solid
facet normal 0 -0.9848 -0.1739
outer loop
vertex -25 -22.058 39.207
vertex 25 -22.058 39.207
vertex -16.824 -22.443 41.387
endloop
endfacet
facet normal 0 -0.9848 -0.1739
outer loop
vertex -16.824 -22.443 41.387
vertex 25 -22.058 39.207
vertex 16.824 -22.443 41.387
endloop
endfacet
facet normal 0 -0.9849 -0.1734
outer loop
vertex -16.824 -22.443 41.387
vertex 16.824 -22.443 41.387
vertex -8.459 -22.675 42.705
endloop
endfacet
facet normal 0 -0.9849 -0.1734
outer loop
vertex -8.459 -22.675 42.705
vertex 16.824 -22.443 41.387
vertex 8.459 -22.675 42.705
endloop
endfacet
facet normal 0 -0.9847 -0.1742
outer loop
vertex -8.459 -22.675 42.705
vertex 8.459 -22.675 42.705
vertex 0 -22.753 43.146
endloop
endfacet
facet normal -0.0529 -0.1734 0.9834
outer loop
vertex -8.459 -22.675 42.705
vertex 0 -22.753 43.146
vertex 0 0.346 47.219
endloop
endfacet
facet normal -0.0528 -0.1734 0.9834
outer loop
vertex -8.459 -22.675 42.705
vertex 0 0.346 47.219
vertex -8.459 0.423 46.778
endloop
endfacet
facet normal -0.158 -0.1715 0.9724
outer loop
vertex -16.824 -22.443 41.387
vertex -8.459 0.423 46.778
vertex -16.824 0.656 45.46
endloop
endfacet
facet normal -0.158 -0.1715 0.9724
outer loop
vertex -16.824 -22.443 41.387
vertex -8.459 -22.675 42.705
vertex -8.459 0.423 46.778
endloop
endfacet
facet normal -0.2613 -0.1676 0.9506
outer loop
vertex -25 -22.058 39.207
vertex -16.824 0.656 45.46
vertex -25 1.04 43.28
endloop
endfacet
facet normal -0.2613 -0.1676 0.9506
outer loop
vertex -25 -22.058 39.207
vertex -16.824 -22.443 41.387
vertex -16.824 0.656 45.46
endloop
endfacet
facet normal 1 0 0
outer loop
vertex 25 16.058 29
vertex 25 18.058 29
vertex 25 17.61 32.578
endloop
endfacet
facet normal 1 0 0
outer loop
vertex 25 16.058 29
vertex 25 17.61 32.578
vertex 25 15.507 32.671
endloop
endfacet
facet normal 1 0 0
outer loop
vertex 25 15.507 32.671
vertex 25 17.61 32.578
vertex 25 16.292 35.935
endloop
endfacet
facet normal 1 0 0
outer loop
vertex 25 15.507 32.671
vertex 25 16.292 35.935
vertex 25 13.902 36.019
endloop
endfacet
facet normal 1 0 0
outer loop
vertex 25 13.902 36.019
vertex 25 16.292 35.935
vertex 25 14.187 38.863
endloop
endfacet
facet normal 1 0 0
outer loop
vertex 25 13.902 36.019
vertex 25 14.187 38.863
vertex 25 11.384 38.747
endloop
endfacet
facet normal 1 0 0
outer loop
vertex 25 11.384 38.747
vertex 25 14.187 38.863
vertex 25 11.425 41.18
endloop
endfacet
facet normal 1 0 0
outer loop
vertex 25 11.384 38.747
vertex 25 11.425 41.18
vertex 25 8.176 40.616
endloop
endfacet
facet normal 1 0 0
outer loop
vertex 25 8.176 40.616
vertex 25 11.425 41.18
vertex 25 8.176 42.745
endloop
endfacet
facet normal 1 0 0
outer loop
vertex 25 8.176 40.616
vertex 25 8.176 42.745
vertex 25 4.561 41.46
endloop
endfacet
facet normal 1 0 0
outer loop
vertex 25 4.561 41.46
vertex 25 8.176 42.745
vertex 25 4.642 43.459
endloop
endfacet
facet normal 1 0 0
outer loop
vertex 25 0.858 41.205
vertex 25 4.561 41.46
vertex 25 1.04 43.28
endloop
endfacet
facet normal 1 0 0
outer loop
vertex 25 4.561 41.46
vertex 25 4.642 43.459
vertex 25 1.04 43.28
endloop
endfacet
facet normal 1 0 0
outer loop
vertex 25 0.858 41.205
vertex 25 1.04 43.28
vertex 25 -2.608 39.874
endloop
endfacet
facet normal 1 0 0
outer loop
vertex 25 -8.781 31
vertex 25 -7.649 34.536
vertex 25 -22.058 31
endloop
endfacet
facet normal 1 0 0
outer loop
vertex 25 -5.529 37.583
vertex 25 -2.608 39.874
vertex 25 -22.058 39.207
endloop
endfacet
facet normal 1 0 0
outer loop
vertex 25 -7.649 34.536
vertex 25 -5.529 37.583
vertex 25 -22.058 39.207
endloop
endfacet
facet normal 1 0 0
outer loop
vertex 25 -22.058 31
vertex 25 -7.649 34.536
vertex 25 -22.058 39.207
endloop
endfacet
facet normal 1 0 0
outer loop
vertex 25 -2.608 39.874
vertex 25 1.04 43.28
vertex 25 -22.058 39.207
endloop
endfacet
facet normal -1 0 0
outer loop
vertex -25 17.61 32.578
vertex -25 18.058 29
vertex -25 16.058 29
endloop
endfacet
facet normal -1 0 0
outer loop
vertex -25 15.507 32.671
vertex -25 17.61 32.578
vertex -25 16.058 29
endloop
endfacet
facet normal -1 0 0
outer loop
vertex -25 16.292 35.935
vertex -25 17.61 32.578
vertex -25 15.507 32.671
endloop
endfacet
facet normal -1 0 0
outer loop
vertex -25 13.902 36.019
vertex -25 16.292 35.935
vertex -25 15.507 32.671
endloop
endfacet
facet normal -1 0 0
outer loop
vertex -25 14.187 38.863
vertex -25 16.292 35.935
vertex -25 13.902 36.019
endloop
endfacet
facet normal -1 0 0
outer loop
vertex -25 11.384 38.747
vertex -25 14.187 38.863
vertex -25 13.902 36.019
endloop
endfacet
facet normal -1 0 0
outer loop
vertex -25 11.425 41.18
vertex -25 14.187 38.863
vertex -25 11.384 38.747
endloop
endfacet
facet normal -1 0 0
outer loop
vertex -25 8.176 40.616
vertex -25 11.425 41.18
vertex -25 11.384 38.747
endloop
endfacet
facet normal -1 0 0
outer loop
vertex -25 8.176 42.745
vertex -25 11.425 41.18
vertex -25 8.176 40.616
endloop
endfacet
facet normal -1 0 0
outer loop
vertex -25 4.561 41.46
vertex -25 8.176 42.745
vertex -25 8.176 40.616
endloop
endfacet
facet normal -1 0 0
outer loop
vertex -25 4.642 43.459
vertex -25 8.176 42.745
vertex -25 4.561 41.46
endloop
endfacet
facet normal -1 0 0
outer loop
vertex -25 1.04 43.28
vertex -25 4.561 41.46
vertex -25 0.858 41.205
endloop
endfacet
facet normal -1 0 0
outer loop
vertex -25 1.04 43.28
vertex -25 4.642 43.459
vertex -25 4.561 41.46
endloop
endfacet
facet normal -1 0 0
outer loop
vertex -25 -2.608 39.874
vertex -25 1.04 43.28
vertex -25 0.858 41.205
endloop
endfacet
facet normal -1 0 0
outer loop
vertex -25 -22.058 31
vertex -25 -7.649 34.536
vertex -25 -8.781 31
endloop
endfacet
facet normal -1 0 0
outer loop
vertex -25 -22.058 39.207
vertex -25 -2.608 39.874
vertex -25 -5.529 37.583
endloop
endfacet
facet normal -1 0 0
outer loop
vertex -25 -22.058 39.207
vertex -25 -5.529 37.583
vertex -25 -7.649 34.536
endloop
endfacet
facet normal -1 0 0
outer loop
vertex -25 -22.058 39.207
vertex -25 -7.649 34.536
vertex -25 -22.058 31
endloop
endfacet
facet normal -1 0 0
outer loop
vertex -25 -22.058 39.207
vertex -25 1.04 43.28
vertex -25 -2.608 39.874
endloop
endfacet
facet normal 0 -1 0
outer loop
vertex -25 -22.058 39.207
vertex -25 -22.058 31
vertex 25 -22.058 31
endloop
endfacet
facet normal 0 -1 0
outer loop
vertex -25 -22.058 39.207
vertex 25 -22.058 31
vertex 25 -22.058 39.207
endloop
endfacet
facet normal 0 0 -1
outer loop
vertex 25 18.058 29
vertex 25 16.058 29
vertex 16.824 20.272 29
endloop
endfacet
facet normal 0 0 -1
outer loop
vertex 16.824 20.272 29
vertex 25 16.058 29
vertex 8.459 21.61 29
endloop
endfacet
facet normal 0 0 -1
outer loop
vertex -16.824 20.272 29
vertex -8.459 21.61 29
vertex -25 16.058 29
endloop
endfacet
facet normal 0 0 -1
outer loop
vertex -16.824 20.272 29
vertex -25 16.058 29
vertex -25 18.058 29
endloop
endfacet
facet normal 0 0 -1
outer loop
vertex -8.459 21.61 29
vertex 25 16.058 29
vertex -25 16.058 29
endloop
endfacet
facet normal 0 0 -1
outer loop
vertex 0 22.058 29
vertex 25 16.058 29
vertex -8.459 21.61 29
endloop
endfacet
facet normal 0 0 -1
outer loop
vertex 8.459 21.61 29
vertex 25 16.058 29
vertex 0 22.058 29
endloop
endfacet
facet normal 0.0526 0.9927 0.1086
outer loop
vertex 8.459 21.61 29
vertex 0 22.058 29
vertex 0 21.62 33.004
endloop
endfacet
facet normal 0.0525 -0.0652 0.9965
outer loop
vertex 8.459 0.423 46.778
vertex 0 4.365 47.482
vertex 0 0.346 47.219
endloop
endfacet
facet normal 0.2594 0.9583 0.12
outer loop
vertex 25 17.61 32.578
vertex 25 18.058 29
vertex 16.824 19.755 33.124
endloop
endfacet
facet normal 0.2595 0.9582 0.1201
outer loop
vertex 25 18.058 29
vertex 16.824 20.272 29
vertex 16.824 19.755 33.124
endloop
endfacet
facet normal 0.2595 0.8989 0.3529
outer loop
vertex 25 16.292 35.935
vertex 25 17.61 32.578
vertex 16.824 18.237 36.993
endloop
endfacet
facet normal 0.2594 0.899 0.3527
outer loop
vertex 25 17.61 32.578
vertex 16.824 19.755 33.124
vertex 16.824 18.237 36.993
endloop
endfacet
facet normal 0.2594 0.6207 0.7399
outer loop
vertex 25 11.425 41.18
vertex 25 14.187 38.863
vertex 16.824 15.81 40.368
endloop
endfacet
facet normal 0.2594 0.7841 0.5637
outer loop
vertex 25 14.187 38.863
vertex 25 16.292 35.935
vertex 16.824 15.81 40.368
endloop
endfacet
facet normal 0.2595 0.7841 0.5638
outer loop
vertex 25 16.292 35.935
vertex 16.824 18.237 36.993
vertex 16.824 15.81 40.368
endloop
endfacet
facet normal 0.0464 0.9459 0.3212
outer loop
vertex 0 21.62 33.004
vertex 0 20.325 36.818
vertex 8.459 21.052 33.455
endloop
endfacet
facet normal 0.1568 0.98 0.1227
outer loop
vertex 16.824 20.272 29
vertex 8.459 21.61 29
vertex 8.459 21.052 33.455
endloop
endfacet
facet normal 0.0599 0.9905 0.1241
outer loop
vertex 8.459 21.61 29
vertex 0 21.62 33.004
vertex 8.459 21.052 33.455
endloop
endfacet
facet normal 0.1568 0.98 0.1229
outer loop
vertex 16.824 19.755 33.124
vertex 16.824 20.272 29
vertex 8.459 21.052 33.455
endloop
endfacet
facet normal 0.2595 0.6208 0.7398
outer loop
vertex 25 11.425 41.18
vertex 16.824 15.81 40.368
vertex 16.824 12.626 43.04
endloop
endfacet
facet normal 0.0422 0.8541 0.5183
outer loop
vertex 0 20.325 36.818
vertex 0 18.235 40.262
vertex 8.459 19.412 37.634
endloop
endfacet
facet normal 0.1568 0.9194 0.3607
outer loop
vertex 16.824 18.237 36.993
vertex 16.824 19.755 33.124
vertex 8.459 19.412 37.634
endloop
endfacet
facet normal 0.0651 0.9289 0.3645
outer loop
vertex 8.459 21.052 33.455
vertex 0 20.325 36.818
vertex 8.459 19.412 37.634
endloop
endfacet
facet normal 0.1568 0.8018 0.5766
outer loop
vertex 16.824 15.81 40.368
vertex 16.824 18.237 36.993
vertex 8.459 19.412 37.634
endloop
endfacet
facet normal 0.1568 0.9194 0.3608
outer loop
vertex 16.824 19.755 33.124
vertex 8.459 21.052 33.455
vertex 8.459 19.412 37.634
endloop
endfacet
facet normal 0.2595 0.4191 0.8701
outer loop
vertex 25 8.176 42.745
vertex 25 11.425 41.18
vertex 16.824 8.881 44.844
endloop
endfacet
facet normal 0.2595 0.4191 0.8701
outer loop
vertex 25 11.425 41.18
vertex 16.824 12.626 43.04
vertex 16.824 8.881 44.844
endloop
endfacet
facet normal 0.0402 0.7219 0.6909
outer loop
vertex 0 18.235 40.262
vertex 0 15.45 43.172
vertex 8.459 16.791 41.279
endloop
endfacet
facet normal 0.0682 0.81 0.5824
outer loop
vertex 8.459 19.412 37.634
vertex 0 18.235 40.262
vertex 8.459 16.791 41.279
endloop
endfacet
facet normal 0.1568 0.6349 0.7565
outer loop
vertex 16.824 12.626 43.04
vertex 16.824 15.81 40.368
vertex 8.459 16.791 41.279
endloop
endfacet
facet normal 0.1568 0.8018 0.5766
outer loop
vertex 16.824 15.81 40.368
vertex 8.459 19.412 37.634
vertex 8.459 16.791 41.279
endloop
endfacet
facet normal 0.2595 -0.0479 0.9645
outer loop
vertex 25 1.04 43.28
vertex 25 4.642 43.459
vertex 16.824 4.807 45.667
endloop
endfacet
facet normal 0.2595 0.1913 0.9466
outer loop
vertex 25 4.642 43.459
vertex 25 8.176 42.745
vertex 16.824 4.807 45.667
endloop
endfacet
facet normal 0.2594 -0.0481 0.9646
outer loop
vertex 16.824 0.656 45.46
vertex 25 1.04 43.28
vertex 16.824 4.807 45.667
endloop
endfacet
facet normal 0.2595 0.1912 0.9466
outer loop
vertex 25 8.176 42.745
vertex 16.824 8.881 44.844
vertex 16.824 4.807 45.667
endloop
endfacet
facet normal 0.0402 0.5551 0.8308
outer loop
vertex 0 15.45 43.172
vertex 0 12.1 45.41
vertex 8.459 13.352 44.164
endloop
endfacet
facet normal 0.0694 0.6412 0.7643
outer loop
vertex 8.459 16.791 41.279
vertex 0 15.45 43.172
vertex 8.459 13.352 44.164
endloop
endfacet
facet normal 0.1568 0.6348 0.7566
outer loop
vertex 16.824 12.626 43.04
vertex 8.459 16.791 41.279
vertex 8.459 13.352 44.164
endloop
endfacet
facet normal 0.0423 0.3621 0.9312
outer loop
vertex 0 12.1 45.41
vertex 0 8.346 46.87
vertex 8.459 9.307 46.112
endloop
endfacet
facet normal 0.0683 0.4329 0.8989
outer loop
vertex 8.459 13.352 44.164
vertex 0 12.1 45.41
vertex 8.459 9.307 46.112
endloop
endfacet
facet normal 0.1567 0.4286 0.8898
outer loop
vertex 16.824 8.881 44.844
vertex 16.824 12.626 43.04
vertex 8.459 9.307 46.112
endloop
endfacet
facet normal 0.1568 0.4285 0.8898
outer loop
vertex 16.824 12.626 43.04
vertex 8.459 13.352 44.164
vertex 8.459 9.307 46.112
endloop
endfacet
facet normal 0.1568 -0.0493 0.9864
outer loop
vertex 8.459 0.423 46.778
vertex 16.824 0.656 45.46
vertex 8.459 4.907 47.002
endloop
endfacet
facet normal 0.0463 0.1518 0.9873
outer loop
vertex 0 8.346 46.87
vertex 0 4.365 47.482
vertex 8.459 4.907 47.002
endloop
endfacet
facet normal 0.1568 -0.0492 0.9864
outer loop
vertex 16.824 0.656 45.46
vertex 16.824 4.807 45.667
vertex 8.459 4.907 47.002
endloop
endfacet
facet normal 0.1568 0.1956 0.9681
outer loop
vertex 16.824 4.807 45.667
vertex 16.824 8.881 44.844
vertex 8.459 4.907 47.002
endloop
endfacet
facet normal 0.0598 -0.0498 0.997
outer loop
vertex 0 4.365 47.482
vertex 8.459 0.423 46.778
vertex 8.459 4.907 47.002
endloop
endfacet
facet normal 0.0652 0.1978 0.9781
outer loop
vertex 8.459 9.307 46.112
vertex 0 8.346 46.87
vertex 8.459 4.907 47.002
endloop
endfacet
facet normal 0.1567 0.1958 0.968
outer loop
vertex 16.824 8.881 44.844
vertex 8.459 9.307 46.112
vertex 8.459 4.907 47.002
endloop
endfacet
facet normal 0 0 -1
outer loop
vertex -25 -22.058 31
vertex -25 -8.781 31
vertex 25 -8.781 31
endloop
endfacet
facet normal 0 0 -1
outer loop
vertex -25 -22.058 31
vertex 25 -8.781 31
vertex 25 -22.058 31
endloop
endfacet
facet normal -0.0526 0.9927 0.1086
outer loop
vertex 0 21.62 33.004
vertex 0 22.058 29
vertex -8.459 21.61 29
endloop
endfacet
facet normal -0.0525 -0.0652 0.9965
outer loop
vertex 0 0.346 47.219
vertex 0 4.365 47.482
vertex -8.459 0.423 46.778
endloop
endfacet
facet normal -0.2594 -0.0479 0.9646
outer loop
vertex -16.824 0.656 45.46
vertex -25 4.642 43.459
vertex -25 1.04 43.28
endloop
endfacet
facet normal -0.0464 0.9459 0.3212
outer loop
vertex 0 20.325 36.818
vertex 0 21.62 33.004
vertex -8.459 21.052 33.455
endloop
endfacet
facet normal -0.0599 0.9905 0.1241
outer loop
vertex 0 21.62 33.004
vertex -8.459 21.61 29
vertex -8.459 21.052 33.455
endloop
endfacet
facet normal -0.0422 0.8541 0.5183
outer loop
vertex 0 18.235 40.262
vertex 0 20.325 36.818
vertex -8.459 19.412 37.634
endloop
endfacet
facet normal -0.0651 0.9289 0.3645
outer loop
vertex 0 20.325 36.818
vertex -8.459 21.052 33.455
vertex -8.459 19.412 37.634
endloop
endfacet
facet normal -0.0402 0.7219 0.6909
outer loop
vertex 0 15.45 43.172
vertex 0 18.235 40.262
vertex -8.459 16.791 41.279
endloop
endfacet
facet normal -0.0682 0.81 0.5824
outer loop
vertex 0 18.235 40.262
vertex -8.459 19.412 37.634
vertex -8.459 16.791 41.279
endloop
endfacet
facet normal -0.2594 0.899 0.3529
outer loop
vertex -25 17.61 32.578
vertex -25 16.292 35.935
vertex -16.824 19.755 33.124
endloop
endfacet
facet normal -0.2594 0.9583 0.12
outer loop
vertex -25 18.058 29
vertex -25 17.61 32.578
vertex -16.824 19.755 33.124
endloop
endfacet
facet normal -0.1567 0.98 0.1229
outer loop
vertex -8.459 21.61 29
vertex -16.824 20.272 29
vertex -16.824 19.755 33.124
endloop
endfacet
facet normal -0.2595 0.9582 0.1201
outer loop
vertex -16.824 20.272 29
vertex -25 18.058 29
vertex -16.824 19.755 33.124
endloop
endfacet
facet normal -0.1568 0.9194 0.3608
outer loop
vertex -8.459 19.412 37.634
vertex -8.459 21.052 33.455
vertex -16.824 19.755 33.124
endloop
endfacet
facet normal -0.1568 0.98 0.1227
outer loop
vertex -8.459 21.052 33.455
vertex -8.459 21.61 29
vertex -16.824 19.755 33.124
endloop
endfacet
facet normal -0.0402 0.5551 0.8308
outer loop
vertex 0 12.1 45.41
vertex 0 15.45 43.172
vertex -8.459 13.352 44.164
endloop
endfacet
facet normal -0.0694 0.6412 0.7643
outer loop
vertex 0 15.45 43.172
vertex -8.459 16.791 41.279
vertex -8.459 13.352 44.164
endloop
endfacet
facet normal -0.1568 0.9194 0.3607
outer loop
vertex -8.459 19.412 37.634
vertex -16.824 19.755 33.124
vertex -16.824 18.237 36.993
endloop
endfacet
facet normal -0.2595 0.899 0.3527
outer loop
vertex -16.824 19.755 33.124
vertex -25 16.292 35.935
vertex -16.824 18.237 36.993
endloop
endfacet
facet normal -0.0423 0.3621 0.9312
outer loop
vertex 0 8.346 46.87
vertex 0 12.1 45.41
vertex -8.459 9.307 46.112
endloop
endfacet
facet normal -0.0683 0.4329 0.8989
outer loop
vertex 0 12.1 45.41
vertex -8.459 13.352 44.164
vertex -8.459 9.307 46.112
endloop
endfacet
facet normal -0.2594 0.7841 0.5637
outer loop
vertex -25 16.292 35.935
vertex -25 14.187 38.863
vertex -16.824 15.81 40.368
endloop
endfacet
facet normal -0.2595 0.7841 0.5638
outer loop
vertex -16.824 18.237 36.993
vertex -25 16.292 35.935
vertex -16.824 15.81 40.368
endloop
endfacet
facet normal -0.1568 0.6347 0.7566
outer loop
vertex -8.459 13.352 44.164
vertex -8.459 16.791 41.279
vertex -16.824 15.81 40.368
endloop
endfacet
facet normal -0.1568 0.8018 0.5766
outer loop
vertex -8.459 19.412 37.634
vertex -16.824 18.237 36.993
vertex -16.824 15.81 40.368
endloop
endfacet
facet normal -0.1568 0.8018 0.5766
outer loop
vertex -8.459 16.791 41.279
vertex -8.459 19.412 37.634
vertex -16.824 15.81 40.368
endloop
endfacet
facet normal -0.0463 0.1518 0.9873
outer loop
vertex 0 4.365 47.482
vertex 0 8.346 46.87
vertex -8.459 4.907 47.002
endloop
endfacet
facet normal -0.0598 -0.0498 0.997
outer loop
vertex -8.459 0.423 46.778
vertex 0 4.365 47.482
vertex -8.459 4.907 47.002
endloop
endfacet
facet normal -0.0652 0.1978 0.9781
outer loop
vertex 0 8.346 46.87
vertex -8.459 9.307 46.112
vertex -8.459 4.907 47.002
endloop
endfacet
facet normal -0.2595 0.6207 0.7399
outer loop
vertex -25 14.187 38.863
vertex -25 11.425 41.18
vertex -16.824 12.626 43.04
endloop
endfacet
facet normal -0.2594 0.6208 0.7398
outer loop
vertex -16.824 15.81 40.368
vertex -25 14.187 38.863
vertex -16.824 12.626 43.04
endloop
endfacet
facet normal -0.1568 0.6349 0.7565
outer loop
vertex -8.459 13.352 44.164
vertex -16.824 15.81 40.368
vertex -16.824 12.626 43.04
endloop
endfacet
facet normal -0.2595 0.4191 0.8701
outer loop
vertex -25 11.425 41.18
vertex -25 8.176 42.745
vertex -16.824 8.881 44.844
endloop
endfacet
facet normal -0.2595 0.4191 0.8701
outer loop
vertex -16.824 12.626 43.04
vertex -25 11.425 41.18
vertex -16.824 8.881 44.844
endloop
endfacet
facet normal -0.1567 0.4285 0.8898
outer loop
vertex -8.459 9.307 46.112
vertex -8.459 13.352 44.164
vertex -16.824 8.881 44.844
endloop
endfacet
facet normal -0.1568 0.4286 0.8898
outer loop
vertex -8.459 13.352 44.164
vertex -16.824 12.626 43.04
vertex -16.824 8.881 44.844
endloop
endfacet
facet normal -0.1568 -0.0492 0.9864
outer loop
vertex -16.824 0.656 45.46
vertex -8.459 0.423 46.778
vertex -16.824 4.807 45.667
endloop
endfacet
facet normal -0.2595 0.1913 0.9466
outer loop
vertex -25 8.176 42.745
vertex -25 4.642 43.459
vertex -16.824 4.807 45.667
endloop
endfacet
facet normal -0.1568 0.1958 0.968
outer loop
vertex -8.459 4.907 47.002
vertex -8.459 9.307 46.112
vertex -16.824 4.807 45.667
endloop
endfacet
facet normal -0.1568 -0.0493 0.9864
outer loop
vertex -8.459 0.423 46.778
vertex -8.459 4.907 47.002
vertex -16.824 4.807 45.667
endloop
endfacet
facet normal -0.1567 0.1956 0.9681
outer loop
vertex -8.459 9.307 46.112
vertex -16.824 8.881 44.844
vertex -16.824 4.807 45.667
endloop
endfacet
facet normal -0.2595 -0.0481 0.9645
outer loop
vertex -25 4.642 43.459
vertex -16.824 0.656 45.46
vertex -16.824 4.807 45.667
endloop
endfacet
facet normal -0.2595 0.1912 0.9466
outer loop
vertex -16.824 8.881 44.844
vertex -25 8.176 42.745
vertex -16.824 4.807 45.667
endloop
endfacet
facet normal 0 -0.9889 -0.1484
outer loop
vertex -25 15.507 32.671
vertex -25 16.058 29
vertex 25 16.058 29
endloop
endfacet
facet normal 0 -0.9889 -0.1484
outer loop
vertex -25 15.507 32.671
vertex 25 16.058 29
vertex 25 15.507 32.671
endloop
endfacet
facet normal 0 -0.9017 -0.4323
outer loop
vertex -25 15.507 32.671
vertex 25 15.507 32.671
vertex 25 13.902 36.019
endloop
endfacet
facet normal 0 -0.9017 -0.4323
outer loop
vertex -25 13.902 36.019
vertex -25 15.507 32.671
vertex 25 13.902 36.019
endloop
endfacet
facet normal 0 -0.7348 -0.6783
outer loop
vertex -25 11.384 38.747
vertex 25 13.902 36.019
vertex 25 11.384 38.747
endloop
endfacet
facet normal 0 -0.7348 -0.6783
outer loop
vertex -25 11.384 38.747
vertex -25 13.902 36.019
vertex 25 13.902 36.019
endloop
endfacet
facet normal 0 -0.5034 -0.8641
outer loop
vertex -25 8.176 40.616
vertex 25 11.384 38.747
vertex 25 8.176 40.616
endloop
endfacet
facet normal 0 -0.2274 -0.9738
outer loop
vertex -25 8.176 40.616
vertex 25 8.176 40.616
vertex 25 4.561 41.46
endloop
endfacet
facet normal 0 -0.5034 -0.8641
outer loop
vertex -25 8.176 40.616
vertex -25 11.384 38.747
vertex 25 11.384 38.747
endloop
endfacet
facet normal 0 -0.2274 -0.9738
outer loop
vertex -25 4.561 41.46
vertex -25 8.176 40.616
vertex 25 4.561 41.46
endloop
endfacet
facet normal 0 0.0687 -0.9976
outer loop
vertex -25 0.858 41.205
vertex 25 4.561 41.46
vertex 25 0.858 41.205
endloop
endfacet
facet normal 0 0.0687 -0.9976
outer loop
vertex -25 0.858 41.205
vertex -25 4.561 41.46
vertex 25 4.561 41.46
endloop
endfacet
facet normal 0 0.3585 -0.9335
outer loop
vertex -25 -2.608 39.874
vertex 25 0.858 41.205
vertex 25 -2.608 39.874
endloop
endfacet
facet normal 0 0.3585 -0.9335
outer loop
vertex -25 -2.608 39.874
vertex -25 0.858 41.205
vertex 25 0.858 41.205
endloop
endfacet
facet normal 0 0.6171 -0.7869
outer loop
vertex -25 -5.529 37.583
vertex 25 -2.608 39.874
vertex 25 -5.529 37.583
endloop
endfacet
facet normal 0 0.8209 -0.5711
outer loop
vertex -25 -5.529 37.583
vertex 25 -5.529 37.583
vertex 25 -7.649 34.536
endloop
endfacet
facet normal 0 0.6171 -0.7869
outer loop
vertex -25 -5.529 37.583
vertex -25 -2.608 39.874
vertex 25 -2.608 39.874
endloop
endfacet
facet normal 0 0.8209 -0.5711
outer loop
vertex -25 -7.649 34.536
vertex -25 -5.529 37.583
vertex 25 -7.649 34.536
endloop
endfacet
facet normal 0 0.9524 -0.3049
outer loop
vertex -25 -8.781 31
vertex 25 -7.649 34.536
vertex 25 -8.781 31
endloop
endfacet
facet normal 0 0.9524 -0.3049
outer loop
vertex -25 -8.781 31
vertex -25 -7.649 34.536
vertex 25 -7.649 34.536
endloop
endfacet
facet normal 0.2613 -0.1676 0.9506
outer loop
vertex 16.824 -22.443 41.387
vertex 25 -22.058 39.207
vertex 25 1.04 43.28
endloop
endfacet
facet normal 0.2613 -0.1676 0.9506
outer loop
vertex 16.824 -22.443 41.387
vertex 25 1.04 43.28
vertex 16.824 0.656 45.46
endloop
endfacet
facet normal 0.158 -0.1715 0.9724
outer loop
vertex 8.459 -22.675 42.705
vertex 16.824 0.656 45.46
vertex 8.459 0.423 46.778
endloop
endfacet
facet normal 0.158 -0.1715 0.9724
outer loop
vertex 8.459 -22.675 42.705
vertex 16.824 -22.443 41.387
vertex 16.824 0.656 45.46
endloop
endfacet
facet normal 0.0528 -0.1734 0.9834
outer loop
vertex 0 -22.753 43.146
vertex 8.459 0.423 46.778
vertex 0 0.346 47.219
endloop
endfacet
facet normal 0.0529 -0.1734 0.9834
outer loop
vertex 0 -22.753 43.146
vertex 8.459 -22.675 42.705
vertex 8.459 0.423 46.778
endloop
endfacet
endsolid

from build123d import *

# Parameters (mm, degrees)
F5_DEPTH = 50


with BuildPart() as f5:
    # F4 (on 3pt) → F5 (new body)
    with BuildSketch(Plane(origin=(-25, 0, 0), x_dir=(0, -1, 0), z_dir=(-1, 0, 0))):
        with BuildLine():
            ThreePointArc((-1.0401698304, 43.2797124187), (6.8786729535, 39.066003665), (10.8033382098, 31))
            Line((10.8033382098, 31), (22.0580684066, 31))
            Line((22.0580684066, 31), (22.0580684066, 39.2068698107))
            Line((22.0580684066, 39.2068698107), (-1.0401698304, 43.2797124187))
        make_face()
        with BuildLine():
            Line((8.7808942727, 31), (10.8033382098, 31))
            ThreePointArc((10.8033382098, 31), (6.8786729535, 39.066003665), (-1.0401698304, 43.2797124187))
            ThreePointArc((-1.0401698304, 43.2797124187), (-12.878488747, 40.1076444252), (-18.0580684066, 29))
            Line((-18.0580684066, 29), (-16.0580684066, 29))
            ThreePointArc((-16.0580684066, 29), (-4.5613047968, 41.4596756276), (8.7808942727, 31))
        make_face()
    extrude(amount=-F5_DEPTH)

    # F6: sweep along a path in F6_path
    with BuildLine(Plane(origin=(25, 18.0580684066, 29), x_dir=(0, 1, 0), z_dir=(-1, 0, 0))) as f6_path:
        ThreePointArc((0, 0), (-5.1795796595, -11.1076444252), (-17.0178985762, -14.2797124187))
        Line((-17.0178985762, -14.2797124187), (-40.1161368131, -10.2068698107))
    # F2 (on offset) → F6 (sweep)
    with BuildSketch(Plane.XY.offset(29)):
        with BuildLine():
            ThreePointArc((25, 18.0580684066), (12.6589889012, 21.0517490389), (0, 22.0580684066))
            ThreePointArc((0, 22.0580684066), (-12.6589889012, 21.0517490389), (-25, 18.0580684066))
            Line((-25, 18.0580684066), (25, 18.0580684066))
        make_face()
    sweep(path=f6_path.line)


solid = f5.part
